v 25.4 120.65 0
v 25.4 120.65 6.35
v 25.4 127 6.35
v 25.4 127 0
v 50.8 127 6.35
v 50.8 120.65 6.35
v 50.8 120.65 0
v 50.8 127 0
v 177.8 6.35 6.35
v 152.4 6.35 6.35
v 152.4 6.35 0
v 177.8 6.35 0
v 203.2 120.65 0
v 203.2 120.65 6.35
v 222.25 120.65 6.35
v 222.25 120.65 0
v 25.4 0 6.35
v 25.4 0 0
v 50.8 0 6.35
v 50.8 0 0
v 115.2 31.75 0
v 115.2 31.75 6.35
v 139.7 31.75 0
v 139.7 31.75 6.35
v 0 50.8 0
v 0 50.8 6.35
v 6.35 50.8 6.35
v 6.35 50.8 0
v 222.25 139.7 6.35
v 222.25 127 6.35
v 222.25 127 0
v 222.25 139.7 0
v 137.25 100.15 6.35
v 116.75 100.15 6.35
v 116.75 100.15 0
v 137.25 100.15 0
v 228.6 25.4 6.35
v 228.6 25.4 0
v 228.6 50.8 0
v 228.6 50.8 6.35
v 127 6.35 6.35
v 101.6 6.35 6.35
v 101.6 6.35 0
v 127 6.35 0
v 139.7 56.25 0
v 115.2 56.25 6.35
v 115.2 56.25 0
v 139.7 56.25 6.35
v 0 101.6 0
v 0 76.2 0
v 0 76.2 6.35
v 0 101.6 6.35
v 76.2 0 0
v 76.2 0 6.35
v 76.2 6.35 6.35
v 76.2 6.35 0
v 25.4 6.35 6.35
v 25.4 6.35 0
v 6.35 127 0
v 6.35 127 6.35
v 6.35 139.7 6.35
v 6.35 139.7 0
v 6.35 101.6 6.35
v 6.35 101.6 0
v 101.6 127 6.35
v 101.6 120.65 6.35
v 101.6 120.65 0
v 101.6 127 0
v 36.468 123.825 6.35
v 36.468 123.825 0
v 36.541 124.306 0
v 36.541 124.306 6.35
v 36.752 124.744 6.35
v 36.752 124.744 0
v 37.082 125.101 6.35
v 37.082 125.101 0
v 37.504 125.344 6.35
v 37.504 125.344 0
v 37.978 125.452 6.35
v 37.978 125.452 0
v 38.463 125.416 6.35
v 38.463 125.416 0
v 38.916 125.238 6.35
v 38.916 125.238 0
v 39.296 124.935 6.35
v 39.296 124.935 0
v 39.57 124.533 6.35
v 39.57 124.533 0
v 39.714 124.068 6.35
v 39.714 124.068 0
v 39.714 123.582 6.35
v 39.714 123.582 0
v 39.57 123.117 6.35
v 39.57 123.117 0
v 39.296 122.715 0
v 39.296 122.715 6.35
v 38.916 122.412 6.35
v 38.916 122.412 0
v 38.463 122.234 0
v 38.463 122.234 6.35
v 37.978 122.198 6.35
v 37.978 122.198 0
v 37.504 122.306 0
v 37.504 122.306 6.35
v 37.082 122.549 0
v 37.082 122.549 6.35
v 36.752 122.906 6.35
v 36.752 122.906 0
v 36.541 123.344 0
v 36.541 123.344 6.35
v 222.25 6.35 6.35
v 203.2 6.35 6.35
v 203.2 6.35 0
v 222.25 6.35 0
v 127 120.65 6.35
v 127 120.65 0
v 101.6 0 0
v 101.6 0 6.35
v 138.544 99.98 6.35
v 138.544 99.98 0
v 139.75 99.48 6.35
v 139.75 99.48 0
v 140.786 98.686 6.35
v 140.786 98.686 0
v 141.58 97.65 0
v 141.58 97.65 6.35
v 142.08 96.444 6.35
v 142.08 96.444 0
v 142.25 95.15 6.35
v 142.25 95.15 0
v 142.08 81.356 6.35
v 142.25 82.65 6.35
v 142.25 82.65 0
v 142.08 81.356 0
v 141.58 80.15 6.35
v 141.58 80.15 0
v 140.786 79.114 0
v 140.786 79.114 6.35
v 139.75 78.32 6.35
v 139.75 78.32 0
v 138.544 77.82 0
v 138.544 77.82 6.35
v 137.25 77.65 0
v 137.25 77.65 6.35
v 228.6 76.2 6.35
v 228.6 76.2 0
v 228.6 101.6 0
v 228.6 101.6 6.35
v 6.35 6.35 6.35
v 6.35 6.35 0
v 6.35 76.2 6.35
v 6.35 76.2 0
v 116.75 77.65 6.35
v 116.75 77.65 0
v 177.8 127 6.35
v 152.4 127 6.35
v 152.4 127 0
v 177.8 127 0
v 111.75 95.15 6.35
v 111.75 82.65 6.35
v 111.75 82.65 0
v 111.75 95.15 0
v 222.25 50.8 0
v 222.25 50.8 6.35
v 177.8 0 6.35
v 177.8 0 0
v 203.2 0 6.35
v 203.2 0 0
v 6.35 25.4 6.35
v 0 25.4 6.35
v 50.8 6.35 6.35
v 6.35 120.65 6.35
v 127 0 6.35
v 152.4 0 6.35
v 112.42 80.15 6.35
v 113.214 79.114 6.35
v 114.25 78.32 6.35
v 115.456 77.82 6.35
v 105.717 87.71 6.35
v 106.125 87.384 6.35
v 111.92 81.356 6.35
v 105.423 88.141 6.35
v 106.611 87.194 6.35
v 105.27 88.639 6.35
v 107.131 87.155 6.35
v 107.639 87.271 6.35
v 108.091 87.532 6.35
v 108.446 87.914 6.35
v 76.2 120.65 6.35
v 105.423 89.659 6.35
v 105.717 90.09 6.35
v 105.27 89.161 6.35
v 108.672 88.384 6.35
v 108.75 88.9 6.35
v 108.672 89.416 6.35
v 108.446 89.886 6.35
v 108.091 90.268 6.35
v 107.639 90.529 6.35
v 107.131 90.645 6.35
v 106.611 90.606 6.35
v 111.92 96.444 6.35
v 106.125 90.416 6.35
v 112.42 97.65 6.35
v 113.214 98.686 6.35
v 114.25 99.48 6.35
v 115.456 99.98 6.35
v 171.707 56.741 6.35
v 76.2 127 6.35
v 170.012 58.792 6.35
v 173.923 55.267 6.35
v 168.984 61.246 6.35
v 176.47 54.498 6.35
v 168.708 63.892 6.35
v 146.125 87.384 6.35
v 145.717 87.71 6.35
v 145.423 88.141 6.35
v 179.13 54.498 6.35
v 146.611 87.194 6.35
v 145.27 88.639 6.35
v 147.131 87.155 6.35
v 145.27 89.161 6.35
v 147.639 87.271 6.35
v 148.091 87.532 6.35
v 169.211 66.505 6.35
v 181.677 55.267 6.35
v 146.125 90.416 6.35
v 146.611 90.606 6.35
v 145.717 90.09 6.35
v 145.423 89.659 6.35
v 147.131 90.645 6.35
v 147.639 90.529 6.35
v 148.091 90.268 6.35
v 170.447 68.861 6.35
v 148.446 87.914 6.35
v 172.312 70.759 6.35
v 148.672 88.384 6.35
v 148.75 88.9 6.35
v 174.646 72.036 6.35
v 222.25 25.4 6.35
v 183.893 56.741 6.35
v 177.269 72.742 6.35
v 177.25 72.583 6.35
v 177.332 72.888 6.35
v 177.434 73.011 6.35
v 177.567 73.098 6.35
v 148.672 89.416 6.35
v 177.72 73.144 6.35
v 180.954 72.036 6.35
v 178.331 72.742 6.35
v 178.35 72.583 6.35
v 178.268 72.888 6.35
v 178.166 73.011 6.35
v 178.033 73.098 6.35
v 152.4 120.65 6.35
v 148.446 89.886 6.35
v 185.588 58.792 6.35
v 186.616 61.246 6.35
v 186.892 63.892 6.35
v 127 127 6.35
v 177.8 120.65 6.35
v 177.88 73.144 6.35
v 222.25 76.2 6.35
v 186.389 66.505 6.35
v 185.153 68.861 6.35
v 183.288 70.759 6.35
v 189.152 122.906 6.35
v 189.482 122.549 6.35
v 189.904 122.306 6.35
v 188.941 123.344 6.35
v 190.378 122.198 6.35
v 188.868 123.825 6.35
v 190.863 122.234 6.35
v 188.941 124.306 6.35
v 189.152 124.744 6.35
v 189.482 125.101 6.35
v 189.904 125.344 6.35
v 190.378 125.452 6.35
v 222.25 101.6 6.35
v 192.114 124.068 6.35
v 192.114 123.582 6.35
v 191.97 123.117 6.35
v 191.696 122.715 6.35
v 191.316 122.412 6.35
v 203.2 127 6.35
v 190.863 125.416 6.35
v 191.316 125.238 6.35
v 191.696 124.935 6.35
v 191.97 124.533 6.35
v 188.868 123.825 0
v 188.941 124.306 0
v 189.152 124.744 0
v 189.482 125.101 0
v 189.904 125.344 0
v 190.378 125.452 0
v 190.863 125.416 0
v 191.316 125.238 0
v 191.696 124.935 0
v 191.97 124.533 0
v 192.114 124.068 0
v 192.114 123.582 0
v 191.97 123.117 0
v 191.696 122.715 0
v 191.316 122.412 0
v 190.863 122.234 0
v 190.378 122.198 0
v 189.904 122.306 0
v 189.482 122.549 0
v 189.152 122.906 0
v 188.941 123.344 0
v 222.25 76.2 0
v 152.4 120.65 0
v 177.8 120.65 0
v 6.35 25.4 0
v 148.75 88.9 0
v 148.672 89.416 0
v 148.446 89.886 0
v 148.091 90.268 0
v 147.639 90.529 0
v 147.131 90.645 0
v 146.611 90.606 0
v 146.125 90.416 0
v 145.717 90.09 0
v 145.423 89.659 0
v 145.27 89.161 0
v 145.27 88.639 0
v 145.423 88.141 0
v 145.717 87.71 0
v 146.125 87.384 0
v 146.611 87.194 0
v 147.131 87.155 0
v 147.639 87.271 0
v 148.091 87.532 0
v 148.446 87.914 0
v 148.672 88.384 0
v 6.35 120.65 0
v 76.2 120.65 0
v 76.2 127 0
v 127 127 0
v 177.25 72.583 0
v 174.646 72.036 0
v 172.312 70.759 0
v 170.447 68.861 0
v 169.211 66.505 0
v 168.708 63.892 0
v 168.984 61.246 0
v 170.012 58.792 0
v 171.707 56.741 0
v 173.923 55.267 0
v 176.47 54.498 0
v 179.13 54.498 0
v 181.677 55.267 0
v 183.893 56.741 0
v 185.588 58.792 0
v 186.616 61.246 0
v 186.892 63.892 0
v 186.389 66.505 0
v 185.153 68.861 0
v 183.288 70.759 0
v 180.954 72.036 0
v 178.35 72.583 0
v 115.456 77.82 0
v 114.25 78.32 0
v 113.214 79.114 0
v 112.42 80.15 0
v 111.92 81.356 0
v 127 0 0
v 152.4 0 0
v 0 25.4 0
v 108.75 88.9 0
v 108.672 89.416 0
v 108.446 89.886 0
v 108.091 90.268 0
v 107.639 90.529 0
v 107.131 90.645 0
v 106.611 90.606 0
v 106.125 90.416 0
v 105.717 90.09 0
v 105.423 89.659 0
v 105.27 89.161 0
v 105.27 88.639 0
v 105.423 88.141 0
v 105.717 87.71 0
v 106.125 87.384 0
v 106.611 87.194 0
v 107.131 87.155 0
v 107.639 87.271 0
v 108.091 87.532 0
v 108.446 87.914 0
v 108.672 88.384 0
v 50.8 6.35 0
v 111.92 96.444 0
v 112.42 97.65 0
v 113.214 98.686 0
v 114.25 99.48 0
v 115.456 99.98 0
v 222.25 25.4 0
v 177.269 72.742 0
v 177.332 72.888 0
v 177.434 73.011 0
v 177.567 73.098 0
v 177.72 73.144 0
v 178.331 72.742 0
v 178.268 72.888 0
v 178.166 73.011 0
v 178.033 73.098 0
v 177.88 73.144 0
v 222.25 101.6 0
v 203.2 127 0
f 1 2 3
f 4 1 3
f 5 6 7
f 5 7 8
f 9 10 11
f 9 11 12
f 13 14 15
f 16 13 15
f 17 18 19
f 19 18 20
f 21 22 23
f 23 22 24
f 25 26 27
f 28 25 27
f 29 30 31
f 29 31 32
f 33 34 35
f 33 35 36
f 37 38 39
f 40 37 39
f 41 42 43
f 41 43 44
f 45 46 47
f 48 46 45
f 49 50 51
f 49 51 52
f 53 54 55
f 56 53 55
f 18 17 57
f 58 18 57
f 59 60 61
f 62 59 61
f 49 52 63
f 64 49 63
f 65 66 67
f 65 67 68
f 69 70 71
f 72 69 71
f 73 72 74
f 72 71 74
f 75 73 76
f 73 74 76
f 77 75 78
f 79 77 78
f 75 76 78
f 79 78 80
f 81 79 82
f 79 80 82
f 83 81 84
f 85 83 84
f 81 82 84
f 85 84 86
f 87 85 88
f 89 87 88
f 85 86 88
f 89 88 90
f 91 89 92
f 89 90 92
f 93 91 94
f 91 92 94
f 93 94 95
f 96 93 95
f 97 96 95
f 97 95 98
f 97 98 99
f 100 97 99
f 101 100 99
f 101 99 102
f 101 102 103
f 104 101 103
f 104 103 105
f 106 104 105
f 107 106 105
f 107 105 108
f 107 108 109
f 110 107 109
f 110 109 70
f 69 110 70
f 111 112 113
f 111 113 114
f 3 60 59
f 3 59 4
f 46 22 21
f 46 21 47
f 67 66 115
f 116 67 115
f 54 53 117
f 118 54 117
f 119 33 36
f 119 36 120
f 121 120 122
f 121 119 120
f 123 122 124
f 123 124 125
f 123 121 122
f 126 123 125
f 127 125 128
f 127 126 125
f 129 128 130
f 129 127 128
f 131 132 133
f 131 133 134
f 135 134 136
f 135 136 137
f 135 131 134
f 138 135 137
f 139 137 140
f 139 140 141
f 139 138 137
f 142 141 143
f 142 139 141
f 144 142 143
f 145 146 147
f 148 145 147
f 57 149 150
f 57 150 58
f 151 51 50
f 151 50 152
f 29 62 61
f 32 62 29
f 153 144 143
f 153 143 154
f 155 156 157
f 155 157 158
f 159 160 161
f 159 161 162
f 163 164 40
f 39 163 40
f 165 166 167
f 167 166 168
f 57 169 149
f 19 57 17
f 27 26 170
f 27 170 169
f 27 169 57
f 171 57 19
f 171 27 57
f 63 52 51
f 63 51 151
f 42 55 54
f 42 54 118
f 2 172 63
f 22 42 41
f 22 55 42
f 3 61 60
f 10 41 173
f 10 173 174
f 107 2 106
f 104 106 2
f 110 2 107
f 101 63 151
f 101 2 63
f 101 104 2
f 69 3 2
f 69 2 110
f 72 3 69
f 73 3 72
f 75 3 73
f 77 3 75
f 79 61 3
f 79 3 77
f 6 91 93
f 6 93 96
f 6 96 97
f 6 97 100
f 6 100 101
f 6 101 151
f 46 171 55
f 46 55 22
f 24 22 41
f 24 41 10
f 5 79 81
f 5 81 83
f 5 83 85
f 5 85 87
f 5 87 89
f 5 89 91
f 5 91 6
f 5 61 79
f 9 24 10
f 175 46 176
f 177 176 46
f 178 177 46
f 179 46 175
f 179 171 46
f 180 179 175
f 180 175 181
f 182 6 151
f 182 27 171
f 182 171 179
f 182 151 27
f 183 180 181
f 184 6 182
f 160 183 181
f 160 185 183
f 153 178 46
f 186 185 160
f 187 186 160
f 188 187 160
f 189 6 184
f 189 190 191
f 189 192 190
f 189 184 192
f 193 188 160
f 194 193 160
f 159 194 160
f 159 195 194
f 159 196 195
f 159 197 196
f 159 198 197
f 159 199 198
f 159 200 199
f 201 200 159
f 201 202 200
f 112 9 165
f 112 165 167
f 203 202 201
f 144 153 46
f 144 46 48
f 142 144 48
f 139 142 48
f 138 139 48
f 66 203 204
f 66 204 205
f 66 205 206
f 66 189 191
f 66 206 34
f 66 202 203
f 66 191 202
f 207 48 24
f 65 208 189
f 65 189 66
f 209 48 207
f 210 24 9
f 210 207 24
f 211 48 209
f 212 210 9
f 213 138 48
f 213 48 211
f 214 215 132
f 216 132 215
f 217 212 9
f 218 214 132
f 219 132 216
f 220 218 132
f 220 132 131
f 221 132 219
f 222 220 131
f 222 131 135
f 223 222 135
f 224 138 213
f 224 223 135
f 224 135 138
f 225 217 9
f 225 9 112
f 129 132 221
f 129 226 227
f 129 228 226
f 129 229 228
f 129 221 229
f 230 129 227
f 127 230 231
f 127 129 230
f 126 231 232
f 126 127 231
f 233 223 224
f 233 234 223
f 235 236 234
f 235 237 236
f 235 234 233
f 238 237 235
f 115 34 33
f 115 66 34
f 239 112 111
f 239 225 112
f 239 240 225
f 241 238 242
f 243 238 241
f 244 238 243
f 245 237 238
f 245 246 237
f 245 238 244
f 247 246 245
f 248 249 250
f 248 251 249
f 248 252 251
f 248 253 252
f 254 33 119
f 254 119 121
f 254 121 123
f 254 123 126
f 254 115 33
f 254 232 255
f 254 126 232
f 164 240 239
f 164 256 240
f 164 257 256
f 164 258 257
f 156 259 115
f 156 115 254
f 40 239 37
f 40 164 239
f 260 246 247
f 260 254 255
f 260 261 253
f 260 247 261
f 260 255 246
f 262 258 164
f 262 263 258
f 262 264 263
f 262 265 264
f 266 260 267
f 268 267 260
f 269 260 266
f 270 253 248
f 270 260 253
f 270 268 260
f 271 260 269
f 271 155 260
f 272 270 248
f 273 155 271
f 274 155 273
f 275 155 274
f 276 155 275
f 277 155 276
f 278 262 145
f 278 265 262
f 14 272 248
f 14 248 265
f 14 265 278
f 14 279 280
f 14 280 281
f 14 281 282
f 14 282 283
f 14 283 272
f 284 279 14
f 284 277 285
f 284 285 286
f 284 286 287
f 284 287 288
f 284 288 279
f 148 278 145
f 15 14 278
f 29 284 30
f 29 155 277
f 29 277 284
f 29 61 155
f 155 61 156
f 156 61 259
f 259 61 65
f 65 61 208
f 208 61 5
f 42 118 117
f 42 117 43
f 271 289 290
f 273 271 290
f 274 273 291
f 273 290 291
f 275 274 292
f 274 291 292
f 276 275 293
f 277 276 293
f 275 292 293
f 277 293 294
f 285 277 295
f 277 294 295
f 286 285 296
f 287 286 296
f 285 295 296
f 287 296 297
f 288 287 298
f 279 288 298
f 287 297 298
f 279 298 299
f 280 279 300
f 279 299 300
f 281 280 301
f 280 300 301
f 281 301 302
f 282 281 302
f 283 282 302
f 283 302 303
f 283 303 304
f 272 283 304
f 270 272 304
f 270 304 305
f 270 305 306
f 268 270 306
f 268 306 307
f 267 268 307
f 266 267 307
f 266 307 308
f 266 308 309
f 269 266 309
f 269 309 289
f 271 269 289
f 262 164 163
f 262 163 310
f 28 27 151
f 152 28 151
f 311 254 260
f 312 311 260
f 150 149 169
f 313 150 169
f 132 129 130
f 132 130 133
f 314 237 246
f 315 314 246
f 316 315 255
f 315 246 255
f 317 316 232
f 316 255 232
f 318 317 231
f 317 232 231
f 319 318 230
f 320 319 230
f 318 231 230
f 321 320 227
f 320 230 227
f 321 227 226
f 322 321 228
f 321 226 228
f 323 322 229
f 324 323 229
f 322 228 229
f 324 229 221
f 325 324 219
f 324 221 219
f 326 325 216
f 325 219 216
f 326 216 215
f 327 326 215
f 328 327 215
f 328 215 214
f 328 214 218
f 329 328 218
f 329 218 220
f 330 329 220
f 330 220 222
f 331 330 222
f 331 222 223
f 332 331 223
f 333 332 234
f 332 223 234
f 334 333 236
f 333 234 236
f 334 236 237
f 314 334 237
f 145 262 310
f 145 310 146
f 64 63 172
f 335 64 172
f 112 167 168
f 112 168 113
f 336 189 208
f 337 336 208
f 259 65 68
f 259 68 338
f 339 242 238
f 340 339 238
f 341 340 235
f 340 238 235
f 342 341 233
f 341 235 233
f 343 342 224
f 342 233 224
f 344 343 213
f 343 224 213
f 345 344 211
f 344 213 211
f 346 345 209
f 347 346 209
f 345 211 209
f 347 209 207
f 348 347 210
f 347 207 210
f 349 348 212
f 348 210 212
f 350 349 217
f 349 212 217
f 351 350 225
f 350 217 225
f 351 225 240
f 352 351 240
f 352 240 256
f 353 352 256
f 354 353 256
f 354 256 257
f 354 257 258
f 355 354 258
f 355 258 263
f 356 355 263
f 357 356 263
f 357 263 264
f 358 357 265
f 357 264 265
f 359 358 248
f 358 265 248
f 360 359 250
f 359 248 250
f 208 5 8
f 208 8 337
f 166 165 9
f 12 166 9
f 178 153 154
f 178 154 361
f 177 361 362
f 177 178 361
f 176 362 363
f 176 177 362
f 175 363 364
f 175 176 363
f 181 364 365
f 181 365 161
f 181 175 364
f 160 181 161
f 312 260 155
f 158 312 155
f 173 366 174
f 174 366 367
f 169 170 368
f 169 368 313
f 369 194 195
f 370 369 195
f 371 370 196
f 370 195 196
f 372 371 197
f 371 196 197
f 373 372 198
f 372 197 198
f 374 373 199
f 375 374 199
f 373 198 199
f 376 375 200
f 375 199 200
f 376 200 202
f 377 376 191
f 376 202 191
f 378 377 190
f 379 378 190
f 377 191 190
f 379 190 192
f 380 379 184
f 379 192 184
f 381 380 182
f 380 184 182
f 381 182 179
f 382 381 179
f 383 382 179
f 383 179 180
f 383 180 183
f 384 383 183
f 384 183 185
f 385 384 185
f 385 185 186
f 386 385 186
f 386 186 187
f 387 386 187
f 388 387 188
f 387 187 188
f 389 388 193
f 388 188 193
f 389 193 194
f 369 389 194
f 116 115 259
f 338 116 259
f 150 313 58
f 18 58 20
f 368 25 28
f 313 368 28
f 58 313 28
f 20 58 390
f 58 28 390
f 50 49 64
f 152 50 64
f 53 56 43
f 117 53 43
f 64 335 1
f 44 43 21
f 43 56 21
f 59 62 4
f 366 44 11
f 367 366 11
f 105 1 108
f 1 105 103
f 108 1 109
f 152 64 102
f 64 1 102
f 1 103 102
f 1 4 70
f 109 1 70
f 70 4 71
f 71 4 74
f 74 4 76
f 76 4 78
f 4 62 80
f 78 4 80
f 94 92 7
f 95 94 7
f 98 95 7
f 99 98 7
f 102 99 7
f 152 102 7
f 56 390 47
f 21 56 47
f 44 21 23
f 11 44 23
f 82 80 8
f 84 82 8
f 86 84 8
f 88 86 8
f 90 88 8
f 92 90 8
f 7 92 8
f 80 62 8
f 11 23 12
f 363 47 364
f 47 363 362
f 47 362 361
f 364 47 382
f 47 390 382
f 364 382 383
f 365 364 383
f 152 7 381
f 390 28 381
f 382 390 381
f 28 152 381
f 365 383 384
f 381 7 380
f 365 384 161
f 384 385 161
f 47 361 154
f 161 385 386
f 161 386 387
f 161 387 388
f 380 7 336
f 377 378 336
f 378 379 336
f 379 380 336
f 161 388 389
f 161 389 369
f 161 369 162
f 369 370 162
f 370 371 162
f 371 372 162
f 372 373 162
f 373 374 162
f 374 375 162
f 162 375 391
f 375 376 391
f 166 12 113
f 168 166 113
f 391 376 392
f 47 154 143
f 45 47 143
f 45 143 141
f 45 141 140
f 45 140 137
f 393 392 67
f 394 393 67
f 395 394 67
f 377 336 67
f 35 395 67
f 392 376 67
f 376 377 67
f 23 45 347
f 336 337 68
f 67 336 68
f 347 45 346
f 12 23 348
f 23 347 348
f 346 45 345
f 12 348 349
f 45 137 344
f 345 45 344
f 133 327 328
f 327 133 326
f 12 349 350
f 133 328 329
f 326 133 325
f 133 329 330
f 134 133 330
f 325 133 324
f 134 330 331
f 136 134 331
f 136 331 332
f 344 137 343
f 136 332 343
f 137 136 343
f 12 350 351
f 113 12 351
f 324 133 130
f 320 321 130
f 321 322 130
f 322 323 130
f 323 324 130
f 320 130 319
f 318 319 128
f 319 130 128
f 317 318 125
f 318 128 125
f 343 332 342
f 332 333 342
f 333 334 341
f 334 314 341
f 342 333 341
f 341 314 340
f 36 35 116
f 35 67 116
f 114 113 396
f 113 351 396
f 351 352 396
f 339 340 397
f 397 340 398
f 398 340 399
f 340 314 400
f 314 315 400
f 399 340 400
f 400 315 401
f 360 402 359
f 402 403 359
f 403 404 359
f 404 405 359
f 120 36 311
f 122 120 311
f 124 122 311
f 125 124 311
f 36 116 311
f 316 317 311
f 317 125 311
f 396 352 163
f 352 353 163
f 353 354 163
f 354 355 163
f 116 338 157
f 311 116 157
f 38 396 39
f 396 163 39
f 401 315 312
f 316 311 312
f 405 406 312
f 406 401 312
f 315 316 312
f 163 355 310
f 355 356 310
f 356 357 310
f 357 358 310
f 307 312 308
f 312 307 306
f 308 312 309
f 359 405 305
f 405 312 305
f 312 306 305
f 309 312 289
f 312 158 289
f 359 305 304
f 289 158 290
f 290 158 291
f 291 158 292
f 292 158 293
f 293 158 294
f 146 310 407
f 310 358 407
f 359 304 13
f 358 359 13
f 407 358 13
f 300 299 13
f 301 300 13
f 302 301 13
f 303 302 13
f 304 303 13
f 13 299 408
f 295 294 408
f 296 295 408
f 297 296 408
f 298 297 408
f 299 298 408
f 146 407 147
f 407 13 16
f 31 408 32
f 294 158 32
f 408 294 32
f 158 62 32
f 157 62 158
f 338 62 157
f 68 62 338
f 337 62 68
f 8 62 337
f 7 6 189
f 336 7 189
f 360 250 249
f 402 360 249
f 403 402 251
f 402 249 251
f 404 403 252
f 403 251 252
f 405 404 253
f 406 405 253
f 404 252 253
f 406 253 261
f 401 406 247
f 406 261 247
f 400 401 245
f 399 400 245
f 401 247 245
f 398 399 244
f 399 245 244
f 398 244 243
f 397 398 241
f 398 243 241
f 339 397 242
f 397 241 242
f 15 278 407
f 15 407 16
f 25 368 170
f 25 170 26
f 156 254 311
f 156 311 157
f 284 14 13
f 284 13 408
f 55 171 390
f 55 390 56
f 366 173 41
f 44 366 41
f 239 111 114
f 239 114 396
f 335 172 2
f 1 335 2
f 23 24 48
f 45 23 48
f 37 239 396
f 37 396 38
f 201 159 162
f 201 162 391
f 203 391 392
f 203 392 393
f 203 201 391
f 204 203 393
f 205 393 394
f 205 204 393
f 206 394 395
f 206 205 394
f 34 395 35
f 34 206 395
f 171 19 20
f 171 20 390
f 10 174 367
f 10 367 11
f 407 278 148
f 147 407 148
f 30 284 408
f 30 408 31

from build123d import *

# Parameters (mm, degrees)
SKETCH1_W                 = 228.6
SKETCH1_H                 = 139.7
BOSS_EXTRUDE1_DEPTH       = 6.35
SKETCH5_W                 = 6.35
SKETCH5_H                 = 25.4
CUT_EXTRUDE4_DEPTH        = 6.35
SKETCH6_W                 = 25.4
SKETCH6_H                 = 6.35
CUT_EXTRUDE5_DEPTH        = 6.35
LPATTERN5_COUNT           = 3
LPATTERN5_PITCH           = 50.8
LPATTERN5_COUNT_DIR2      = 2
LPATTERN5_PITCH_DIR2      = 222.25
LPATTERN6_COUNT           = 5
LPATTERN6_PITCH           = 50.8
LPATTERN6_COUNT_DIR2      = 2
LPATTERN6_PITCH_DIR2      = 120.65
SKETCH7_W                 = 6.35
SKETCH7_H                 = 19.05
CUT_EXTRUDE6_DEPTH        = 6.35
SKETCH8_W                 = 6.35
SKETCH8_H                 = 19.05
CUT_EXTRUDE7_DEPTH        = 6.35
F_4_CLEARANCE_HOLE1_D     = 3.2639
F_4_CLEARANCE_HOLE1_DEPTH = 10.16
F_4_CLEARANCE_HOLE1_TIP   = 0.980574487
SKETCH11_R                = 0.55
SKETCH11_R_2              = 9.1
CUT_EXTRUDE8_DEPTH        = 6.35
SKETCH12_R                = 1.75
CUT_EXTRUDE9_DEPTH        = 6.35
SKETCH13_W                = 24.5
SKETCH13_H                = 24.5
CUT_EXTRUDE10_DEPTH       = 6.35


with BuildPart() as part:
    # Sketch1 → Boss-Extrude1 (new body)
    with BuildSketch(Plane.XY):
        with Locations((114.3, 69.85)):
            Rectangle(SKETCH1_W, SKETCH1_H)
    extrude(amount=BOSS_EXTRUDE1_DEPTH)

    # Sketch5 → Cut-Extrude4 (cut)
    with BuildSketch(Plane.XY.offset(6.35)):
        with Locations((3.175, 12.7)):
            Rectangle(SKETCH5_W, SKETCH5_H)
    cut_extrude4 = extrude(amount=-CUT_EXTRUDE4_DEPTH, mode=Mode.SUBTRACT)

    # Sketch6 → Cut-Extrude5 (cut)
    with BuildSketch(Plane.XY.offset(6.35)):
        with Locations((12.7, 3.175)):
            Rectangle(SKETCH6_W, SKETCH6_H)
    cut_extrude5 = extrude(amount=-CUT_EXTRUDE5_DEPTH, mode=Mode.SUBTRACT)

    # LPattern5: Cut-Extrude4 3 × 2
    with Locations(*[(j * LPATTERN5_PITCH_DIR2, i * LPATTERN5_PITCH, 0) for i in range(LPATTERN5_COUNT) for j in range(LPATTERN5_COUNT_DIR2) if (i, j) != (0, 0)]):
        add(cut_extrude4, mode=Mode.SUBTRACT)

    # LPattern6: Cut-Extrude5 5 × 2
    with Locations(*[(i * LPATTERN6_PITCH, j * LPATTERN6_PITCH_DIR2, 0) for i in range(LPATTERN6_COUNT) for j in range(LPATTERN6_COUNT_DIR2) if (i, j) != (0, 0)]):
        add(cut_extrude5, mode=Mode.SUBTRACT)

    # Sketch7 → Cut-Extrude6 (cut)
    with BuildSketch(Plane.XY.offset(6.35)):
        with Locations((3.175, 130.175)):
            Rectangle(SKETCH7_W, SKETCH7_H)
    extrude(amount=-CUT_EXTRUDE6_DEPTH, mode=Mode.SUBTRACT)

    # Sketch8 → Cut-Extrude7 (cut)
    with BuildSketch(Plane.XY.offset(6.35)):
        with Locations((225.425, 130.175)):
            Rectangle(SKETCH8_W, SKETCH8_H)
    extrude(amount=-CUT_EXTRUDE7_DEPTH, mode=Mode.SUBTRACT)

    # #4 Clearance Hole1
    with Locations(Plane.XY.offset(6.35)):
        with Locations((38.1, 123.825), (190.5, 123.825)):
            Hole(F_4_CLEARANCE_HOLE1_D / 2, depth=F_4_CLEARANCE_HOLE1_DEPTH)
            with Locations((0, 0, -(F_4_CLEARANCE_HOLE1_DEPTH + F_4_CLEARANCE_HOLE1_TIP / 2))):  # 118° drill point
                Cone(0, F_4_CLEARANCE_HOLE1_D / 2, F_4_CLEARANCE_HOLE1_TIP, mode=Mode.SUBTRACT)

    # Sketch11 → Cut-Extrude8 (cut)
    with BuildSketch(Plane.XY.offset(6.35)):
        with Locations((177.8, 72.6)):
            Circle(SKETCH11_R)
        with Locations((177.8, 63.5)):
            Circle(SKETCH11_R_2)
    extrude(amount=-CUT_EXTRUDE8_DEPTH, mode=Mode.SUBTRACT)

    # Sketch12 → Cut-Extrude9 (cut)
    with BuildSketch(Plane.XY.offset(6.35)):
        with Locations((107, 88.9)):
            Circle(SKETCH12_R)
        with Locations((147, 88.9)):
            Circle(SKETCH12_R)
        with BuildLine():
            Line((116.75, 100.15), (137.25, 100.15))
            ThreePointArc((137.25, 100.15), (140.785533906, 98.685533906), (142.25, 95.15))
            Line((142.25, 95.15), (142.25, 82.65))
            ThreePointArc((142.25, 82.65), (140.785533906, 79.114466094), (137.25, 77.65))
            Line((137.25, 77.65), (116.75, 77.65))
            ThreePointArc((116.75, 77.65), (113.214466094, 79.114466094), (111.75, 82.65))
            Line((111.75, 82.65), (111.75, 95.15))
            ThreePointArc((111.75, 95.15), (113.214466094, 98.685533906), (116.75, 100.15))
        make_face()
    extrude(amount=-CUT_EXTRUDE9_DEPTH, mode=Mode.SUBTRACT)

    # Sketch13 → Cut-Extrude10 (cut)
    with BuildSketch(Plane.XY.offset(6.35)):
        with Locations((127.45, 44)):
            Rectangle(SKETCH13_W, SKETCH13_H)
    extrude(amount=-CUT_EXTRUDE10_DEPTH, mode=Mode.SUBTRACT)


solid = part.part
